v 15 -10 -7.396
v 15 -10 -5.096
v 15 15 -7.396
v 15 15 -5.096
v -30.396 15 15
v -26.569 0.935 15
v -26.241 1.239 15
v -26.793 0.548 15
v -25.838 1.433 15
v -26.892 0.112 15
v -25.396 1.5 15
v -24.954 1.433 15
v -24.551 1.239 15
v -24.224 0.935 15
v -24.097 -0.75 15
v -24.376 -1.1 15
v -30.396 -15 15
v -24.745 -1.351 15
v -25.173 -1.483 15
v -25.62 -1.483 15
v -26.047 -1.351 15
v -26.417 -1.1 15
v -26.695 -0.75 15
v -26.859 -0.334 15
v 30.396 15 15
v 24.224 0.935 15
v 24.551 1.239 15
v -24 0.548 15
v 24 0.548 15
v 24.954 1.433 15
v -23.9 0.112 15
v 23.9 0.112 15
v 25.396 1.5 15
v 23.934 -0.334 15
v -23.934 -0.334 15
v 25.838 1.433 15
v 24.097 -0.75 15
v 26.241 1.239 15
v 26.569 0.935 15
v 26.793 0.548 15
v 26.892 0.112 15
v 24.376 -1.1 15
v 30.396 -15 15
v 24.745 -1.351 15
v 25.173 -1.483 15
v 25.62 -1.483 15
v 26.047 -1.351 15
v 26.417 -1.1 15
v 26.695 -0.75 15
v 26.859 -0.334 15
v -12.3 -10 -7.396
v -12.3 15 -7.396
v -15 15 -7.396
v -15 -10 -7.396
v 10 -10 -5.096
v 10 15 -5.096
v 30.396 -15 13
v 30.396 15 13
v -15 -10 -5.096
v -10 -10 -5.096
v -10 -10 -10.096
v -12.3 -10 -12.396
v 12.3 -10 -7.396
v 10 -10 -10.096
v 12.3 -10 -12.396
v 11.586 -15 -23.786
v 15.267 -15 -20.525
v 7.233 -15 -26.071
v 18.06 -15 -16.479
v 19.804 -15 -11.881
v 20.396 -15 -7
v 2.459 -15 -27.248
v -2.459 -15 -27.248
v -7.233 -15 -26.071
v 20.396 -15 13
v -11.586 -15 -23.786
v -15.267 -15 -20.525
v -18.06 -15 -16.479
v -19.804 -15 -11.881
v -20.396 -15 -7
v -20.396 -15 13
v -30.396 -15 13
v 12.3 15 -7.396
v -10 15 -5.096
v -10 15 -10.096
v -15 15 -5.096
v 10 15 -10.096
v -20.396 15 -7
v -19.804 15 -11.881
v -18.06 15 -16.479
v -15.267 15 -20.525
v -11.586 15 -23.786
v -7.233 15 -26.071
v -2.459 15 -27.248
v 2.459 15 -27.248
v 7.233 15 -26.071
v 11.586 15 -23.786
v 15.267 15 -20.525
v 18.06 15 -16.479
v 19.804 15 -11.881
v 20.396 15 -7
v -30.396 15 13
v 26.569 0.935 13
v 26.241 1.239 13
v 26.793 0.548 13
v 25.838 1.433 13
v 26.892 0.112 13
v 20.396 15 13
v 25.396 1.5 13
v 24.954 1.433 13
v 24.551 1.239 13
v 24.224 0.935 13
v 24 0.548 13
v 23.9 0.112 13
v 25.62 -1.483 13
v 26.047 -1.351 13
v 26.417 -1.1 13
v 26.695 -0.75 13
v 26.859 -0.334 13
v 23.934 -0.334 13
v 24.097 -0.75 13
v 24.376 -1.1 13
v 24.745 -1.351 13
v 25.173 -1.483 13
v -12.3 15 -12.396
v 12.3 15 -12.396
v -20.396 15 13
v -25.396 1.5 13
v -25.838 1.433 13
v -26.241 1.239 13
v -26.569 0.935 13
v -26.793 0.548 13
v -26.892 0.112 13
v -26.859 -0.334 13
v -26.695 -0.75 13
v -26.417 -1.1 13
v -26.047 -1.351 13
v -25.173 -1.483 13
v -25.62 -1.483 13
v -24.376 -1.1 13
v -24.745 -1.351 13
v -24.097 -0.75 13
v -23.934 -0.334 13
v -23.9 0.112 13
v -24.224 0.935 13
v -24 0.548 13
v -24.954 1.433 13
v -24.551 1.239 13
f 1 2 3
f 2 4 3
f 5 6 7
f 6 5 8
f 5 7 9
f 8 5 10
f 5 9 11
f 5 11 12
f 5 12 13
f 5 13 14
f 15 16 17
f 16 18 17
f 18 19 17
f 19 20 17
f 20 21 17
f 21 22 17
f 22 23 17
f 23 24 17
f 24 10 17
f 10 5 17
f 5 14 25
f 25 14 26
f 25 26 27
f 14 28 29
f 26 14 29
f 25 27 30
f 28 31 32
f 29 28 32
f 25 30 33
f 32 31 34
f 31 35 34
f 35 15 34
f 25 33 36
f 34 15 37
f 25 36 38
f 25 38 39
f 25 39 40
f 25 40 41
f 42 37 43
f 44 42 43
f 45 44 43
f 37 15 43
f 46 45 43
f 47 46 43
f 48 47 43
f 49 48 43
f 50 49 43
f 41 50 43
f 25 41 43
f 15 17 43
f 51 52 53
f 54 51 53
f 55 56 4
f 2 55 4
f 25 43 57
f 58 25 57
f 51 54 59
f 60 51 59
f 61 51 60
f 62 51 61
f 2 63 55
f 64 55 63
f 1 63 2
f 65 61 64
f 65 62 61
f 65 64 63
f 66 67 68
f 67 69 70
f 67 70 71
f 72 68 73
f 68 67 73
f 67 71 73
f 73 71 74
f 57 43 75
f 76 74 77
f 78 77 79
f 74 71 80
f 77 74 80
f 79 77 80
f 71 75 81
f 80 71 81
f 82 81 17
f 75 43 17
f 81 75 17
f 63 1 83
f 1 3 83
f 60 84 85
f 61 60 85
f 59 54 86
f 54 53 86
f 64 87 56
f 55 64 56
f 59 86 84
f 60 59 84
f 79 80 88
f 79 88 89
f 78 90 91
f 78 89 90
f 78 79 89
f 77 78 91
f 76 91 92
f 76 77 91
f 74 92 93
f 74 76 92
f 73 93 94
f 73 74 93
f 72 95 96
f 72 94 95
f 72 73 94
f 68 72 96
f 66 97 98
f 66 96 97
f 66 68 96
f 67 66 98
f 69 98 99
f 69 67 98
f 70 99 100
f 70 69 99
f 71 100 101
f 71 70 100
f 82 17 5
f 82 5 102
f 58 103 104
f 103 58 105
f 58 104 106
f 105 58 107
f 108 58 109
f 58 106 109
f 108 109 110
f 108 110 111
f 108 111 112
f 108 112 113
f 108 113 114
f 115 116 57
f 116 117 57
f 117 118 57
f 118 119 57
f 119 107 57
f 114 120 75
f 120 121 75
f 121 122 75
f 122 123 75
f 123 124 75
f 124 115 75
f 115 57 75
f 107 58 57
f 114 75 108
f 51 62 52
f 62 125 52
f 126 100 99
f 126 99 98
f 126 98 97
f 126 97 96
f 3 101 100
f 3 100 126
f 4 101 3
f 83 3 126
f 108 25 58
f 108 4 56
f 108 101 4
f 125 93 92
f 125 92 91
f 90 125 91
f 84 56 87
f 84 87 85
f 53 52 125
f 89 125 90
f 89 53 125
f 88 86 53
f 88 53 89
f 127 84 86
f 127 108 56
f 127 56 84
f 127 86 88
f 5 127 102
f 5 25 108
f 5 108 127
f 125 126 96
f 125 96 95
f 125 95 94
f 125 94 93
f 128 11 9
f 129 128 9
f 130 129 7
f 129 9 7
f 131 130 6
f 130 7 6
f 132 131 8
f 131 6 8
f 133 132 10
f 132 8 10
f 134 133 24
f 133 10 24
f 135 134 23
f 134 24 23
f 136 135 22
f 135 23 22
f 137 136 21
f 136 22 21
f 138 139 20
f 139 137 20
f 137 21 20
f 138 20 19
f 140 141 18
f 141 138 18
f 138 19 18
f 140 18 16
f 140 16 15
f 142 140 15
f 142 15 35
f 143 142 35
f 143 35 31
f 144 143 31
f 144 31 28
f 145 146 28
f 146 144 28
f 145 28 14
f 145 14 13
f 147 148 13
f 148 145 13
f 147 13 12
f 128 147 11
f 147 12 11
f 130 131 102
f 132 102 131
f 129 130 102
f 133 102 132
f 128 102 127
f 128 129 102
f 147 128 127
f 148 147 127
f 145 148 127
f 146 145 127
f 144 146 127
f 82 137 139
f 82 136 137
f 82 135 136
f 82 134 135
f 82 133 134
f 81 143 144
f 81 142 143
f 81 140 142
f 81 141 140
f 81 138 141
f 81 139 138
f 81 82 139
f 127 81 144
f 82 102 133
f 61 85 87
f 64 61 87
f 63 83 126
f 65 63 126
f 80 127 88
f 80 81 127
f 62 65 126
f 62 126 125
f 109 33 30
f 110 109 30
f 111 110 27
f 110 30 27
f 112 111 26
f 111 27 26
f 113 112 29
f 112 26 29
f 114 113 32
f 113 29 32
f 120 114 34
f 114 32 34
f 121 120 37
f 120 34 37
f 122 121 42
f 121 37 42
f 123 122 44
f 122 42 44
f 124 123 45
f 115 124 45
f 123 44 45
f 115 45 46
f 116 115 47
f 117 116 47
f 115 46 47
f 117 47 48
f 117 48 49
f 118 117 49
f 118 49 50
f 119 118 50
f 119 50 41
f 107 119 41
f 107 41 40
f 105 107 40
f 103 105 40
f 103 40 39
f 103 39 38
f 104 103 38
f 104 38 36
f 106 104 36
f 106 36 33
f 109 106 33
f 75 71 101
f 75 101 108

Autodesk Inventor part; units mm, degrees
ref_plane "YZ Plane" through (0, 0, 0) normal (1, 0, 0) x (0, 1, 0)
ref_plane "XZ Plane" through (0, 0, 0) normal (0, 1, 0) x (-1, 0, 0)
ref_plane "XY Plane" through (0, 0, 0) normal (0, 0, 1) x (1, 0, 0)
sketch "Sketch1" plane through (0, 0, 0) normal (0, 1, 0) x (-1, 0, 0)
  line L0 (-20.3963, -7) -> (-20.3963, 13)
  line L1 (-20.3963, 15) -> (20.3963, 15)
  line L2 (20.3963, 13) -> (20.3963, -7)
  arc A0 (-20.3963, -7) -> (20.3963, -7) centre (0, -7) ccw
  line L3 (20.3963, 15) -> (30.3963, 15)
  line L4 (30.3963, 15) -> (30.3963, 13)
  line L5 (30.3963, 13) -> (20.3963, 13)
  line L6 (-20.3963, 15) -> (-30.3963, 15)
  line L7 (-30.3963, 15) -> (-30.3963, 13)
  line L8 (-30.3963, 13) -> (-20.3963, 13)
  point P0 (0, 0)
  point P1 (0, 15)
  point P2 (20.3963, 0)
  dimension "d1" = 2
  dimension "d2" = 2
  dimension "d3" = 10
  dimension "d4" = 10
  dimension "d5" = 20
  dimension "d6" = 20.3963
extrude "Extrusion1" add sketch "Sketch1" along normal mid plane 30
sketch "Sketch2" plane through (0, 15, 0) normal (0, 1, 0) x (1, 0, 0)
  line L0 (-15, 5.0963) -> (-10, 5.0963)
  line L1 (-10, 5.0963) -> (-10, 10.0963)
  line L2 (-10, 10.0963) -> (10, 10.0963)
  line L3 (10, 10.0963) -> (10, 5.0963)
  line L4 (10, 5.0963) -> (15, 5.0963)
  line L5 (15, 5.0963) -> (15, 7.3963)
  line L6 (15, 7.3963) -> (12.3, 7.3963)
  line L7 (12.3, 7.3963) -> (12.3, 12.3963)
  line L8 (12.3, 12.3963) -> (-12.3, 12.3963)
  line L9 (-12.3, 12.3963) -> (-12.3, 7.3963)
  line L10 (-12.3, 7.3963) -> (-15, 7.3963)
  line L11 (-15, 7.3963) -> (-15, 5.0963)
  arc A0 (20.3963, 7) -> (-20.3963, 7) centre (0, 7) ccw projected
  point P0 (0, 0)
  point P1 (0, 12.3963)
  point P2 (0, 10.0963)
  point P3 (0, 27.3963)
  point P4 (15, 6.2463)
  point P5 (-15, 6.2463)
  point P6 (10, 7.5963)
  point P7 (-10, 7.5963)
  point P8 (-12.5, 5.0963)
  point P9 (-13.65, 7.3963)
  dimension "d9" = 15
  dimension "d11" = 2.3
  dimension "d13" = 24.6
  dimension "d14" = 20
  dimension "d15" = 5
  dimension "d17" = 5
  dimension "d27" = 2.3
extrude "Extrusion2" cut sketch "Sketch2" against normal blind 25
sketch "Sketch3" plane through (30.3963, 15, 13) normal (0, 0, -1) x (-1, 0, 0)
  line L0 (0, -30) -> (0, 0) projected
  line L1 (0, 0) -> (10, 0) projected
  point P0 (30.3963, -15)
  point P1 (5, -15)
  point P2 (0, -15)
  point P3 (5, 0)
hole "Hole1" at (25.3963, 0, 13) direction (0, 0, 1) diameter 3 depth 2
mirror "Mirror1" about plane through (0, 0, 0) normal (1, 0, 0) of "Hole1"
properties part number "Part_B7"
